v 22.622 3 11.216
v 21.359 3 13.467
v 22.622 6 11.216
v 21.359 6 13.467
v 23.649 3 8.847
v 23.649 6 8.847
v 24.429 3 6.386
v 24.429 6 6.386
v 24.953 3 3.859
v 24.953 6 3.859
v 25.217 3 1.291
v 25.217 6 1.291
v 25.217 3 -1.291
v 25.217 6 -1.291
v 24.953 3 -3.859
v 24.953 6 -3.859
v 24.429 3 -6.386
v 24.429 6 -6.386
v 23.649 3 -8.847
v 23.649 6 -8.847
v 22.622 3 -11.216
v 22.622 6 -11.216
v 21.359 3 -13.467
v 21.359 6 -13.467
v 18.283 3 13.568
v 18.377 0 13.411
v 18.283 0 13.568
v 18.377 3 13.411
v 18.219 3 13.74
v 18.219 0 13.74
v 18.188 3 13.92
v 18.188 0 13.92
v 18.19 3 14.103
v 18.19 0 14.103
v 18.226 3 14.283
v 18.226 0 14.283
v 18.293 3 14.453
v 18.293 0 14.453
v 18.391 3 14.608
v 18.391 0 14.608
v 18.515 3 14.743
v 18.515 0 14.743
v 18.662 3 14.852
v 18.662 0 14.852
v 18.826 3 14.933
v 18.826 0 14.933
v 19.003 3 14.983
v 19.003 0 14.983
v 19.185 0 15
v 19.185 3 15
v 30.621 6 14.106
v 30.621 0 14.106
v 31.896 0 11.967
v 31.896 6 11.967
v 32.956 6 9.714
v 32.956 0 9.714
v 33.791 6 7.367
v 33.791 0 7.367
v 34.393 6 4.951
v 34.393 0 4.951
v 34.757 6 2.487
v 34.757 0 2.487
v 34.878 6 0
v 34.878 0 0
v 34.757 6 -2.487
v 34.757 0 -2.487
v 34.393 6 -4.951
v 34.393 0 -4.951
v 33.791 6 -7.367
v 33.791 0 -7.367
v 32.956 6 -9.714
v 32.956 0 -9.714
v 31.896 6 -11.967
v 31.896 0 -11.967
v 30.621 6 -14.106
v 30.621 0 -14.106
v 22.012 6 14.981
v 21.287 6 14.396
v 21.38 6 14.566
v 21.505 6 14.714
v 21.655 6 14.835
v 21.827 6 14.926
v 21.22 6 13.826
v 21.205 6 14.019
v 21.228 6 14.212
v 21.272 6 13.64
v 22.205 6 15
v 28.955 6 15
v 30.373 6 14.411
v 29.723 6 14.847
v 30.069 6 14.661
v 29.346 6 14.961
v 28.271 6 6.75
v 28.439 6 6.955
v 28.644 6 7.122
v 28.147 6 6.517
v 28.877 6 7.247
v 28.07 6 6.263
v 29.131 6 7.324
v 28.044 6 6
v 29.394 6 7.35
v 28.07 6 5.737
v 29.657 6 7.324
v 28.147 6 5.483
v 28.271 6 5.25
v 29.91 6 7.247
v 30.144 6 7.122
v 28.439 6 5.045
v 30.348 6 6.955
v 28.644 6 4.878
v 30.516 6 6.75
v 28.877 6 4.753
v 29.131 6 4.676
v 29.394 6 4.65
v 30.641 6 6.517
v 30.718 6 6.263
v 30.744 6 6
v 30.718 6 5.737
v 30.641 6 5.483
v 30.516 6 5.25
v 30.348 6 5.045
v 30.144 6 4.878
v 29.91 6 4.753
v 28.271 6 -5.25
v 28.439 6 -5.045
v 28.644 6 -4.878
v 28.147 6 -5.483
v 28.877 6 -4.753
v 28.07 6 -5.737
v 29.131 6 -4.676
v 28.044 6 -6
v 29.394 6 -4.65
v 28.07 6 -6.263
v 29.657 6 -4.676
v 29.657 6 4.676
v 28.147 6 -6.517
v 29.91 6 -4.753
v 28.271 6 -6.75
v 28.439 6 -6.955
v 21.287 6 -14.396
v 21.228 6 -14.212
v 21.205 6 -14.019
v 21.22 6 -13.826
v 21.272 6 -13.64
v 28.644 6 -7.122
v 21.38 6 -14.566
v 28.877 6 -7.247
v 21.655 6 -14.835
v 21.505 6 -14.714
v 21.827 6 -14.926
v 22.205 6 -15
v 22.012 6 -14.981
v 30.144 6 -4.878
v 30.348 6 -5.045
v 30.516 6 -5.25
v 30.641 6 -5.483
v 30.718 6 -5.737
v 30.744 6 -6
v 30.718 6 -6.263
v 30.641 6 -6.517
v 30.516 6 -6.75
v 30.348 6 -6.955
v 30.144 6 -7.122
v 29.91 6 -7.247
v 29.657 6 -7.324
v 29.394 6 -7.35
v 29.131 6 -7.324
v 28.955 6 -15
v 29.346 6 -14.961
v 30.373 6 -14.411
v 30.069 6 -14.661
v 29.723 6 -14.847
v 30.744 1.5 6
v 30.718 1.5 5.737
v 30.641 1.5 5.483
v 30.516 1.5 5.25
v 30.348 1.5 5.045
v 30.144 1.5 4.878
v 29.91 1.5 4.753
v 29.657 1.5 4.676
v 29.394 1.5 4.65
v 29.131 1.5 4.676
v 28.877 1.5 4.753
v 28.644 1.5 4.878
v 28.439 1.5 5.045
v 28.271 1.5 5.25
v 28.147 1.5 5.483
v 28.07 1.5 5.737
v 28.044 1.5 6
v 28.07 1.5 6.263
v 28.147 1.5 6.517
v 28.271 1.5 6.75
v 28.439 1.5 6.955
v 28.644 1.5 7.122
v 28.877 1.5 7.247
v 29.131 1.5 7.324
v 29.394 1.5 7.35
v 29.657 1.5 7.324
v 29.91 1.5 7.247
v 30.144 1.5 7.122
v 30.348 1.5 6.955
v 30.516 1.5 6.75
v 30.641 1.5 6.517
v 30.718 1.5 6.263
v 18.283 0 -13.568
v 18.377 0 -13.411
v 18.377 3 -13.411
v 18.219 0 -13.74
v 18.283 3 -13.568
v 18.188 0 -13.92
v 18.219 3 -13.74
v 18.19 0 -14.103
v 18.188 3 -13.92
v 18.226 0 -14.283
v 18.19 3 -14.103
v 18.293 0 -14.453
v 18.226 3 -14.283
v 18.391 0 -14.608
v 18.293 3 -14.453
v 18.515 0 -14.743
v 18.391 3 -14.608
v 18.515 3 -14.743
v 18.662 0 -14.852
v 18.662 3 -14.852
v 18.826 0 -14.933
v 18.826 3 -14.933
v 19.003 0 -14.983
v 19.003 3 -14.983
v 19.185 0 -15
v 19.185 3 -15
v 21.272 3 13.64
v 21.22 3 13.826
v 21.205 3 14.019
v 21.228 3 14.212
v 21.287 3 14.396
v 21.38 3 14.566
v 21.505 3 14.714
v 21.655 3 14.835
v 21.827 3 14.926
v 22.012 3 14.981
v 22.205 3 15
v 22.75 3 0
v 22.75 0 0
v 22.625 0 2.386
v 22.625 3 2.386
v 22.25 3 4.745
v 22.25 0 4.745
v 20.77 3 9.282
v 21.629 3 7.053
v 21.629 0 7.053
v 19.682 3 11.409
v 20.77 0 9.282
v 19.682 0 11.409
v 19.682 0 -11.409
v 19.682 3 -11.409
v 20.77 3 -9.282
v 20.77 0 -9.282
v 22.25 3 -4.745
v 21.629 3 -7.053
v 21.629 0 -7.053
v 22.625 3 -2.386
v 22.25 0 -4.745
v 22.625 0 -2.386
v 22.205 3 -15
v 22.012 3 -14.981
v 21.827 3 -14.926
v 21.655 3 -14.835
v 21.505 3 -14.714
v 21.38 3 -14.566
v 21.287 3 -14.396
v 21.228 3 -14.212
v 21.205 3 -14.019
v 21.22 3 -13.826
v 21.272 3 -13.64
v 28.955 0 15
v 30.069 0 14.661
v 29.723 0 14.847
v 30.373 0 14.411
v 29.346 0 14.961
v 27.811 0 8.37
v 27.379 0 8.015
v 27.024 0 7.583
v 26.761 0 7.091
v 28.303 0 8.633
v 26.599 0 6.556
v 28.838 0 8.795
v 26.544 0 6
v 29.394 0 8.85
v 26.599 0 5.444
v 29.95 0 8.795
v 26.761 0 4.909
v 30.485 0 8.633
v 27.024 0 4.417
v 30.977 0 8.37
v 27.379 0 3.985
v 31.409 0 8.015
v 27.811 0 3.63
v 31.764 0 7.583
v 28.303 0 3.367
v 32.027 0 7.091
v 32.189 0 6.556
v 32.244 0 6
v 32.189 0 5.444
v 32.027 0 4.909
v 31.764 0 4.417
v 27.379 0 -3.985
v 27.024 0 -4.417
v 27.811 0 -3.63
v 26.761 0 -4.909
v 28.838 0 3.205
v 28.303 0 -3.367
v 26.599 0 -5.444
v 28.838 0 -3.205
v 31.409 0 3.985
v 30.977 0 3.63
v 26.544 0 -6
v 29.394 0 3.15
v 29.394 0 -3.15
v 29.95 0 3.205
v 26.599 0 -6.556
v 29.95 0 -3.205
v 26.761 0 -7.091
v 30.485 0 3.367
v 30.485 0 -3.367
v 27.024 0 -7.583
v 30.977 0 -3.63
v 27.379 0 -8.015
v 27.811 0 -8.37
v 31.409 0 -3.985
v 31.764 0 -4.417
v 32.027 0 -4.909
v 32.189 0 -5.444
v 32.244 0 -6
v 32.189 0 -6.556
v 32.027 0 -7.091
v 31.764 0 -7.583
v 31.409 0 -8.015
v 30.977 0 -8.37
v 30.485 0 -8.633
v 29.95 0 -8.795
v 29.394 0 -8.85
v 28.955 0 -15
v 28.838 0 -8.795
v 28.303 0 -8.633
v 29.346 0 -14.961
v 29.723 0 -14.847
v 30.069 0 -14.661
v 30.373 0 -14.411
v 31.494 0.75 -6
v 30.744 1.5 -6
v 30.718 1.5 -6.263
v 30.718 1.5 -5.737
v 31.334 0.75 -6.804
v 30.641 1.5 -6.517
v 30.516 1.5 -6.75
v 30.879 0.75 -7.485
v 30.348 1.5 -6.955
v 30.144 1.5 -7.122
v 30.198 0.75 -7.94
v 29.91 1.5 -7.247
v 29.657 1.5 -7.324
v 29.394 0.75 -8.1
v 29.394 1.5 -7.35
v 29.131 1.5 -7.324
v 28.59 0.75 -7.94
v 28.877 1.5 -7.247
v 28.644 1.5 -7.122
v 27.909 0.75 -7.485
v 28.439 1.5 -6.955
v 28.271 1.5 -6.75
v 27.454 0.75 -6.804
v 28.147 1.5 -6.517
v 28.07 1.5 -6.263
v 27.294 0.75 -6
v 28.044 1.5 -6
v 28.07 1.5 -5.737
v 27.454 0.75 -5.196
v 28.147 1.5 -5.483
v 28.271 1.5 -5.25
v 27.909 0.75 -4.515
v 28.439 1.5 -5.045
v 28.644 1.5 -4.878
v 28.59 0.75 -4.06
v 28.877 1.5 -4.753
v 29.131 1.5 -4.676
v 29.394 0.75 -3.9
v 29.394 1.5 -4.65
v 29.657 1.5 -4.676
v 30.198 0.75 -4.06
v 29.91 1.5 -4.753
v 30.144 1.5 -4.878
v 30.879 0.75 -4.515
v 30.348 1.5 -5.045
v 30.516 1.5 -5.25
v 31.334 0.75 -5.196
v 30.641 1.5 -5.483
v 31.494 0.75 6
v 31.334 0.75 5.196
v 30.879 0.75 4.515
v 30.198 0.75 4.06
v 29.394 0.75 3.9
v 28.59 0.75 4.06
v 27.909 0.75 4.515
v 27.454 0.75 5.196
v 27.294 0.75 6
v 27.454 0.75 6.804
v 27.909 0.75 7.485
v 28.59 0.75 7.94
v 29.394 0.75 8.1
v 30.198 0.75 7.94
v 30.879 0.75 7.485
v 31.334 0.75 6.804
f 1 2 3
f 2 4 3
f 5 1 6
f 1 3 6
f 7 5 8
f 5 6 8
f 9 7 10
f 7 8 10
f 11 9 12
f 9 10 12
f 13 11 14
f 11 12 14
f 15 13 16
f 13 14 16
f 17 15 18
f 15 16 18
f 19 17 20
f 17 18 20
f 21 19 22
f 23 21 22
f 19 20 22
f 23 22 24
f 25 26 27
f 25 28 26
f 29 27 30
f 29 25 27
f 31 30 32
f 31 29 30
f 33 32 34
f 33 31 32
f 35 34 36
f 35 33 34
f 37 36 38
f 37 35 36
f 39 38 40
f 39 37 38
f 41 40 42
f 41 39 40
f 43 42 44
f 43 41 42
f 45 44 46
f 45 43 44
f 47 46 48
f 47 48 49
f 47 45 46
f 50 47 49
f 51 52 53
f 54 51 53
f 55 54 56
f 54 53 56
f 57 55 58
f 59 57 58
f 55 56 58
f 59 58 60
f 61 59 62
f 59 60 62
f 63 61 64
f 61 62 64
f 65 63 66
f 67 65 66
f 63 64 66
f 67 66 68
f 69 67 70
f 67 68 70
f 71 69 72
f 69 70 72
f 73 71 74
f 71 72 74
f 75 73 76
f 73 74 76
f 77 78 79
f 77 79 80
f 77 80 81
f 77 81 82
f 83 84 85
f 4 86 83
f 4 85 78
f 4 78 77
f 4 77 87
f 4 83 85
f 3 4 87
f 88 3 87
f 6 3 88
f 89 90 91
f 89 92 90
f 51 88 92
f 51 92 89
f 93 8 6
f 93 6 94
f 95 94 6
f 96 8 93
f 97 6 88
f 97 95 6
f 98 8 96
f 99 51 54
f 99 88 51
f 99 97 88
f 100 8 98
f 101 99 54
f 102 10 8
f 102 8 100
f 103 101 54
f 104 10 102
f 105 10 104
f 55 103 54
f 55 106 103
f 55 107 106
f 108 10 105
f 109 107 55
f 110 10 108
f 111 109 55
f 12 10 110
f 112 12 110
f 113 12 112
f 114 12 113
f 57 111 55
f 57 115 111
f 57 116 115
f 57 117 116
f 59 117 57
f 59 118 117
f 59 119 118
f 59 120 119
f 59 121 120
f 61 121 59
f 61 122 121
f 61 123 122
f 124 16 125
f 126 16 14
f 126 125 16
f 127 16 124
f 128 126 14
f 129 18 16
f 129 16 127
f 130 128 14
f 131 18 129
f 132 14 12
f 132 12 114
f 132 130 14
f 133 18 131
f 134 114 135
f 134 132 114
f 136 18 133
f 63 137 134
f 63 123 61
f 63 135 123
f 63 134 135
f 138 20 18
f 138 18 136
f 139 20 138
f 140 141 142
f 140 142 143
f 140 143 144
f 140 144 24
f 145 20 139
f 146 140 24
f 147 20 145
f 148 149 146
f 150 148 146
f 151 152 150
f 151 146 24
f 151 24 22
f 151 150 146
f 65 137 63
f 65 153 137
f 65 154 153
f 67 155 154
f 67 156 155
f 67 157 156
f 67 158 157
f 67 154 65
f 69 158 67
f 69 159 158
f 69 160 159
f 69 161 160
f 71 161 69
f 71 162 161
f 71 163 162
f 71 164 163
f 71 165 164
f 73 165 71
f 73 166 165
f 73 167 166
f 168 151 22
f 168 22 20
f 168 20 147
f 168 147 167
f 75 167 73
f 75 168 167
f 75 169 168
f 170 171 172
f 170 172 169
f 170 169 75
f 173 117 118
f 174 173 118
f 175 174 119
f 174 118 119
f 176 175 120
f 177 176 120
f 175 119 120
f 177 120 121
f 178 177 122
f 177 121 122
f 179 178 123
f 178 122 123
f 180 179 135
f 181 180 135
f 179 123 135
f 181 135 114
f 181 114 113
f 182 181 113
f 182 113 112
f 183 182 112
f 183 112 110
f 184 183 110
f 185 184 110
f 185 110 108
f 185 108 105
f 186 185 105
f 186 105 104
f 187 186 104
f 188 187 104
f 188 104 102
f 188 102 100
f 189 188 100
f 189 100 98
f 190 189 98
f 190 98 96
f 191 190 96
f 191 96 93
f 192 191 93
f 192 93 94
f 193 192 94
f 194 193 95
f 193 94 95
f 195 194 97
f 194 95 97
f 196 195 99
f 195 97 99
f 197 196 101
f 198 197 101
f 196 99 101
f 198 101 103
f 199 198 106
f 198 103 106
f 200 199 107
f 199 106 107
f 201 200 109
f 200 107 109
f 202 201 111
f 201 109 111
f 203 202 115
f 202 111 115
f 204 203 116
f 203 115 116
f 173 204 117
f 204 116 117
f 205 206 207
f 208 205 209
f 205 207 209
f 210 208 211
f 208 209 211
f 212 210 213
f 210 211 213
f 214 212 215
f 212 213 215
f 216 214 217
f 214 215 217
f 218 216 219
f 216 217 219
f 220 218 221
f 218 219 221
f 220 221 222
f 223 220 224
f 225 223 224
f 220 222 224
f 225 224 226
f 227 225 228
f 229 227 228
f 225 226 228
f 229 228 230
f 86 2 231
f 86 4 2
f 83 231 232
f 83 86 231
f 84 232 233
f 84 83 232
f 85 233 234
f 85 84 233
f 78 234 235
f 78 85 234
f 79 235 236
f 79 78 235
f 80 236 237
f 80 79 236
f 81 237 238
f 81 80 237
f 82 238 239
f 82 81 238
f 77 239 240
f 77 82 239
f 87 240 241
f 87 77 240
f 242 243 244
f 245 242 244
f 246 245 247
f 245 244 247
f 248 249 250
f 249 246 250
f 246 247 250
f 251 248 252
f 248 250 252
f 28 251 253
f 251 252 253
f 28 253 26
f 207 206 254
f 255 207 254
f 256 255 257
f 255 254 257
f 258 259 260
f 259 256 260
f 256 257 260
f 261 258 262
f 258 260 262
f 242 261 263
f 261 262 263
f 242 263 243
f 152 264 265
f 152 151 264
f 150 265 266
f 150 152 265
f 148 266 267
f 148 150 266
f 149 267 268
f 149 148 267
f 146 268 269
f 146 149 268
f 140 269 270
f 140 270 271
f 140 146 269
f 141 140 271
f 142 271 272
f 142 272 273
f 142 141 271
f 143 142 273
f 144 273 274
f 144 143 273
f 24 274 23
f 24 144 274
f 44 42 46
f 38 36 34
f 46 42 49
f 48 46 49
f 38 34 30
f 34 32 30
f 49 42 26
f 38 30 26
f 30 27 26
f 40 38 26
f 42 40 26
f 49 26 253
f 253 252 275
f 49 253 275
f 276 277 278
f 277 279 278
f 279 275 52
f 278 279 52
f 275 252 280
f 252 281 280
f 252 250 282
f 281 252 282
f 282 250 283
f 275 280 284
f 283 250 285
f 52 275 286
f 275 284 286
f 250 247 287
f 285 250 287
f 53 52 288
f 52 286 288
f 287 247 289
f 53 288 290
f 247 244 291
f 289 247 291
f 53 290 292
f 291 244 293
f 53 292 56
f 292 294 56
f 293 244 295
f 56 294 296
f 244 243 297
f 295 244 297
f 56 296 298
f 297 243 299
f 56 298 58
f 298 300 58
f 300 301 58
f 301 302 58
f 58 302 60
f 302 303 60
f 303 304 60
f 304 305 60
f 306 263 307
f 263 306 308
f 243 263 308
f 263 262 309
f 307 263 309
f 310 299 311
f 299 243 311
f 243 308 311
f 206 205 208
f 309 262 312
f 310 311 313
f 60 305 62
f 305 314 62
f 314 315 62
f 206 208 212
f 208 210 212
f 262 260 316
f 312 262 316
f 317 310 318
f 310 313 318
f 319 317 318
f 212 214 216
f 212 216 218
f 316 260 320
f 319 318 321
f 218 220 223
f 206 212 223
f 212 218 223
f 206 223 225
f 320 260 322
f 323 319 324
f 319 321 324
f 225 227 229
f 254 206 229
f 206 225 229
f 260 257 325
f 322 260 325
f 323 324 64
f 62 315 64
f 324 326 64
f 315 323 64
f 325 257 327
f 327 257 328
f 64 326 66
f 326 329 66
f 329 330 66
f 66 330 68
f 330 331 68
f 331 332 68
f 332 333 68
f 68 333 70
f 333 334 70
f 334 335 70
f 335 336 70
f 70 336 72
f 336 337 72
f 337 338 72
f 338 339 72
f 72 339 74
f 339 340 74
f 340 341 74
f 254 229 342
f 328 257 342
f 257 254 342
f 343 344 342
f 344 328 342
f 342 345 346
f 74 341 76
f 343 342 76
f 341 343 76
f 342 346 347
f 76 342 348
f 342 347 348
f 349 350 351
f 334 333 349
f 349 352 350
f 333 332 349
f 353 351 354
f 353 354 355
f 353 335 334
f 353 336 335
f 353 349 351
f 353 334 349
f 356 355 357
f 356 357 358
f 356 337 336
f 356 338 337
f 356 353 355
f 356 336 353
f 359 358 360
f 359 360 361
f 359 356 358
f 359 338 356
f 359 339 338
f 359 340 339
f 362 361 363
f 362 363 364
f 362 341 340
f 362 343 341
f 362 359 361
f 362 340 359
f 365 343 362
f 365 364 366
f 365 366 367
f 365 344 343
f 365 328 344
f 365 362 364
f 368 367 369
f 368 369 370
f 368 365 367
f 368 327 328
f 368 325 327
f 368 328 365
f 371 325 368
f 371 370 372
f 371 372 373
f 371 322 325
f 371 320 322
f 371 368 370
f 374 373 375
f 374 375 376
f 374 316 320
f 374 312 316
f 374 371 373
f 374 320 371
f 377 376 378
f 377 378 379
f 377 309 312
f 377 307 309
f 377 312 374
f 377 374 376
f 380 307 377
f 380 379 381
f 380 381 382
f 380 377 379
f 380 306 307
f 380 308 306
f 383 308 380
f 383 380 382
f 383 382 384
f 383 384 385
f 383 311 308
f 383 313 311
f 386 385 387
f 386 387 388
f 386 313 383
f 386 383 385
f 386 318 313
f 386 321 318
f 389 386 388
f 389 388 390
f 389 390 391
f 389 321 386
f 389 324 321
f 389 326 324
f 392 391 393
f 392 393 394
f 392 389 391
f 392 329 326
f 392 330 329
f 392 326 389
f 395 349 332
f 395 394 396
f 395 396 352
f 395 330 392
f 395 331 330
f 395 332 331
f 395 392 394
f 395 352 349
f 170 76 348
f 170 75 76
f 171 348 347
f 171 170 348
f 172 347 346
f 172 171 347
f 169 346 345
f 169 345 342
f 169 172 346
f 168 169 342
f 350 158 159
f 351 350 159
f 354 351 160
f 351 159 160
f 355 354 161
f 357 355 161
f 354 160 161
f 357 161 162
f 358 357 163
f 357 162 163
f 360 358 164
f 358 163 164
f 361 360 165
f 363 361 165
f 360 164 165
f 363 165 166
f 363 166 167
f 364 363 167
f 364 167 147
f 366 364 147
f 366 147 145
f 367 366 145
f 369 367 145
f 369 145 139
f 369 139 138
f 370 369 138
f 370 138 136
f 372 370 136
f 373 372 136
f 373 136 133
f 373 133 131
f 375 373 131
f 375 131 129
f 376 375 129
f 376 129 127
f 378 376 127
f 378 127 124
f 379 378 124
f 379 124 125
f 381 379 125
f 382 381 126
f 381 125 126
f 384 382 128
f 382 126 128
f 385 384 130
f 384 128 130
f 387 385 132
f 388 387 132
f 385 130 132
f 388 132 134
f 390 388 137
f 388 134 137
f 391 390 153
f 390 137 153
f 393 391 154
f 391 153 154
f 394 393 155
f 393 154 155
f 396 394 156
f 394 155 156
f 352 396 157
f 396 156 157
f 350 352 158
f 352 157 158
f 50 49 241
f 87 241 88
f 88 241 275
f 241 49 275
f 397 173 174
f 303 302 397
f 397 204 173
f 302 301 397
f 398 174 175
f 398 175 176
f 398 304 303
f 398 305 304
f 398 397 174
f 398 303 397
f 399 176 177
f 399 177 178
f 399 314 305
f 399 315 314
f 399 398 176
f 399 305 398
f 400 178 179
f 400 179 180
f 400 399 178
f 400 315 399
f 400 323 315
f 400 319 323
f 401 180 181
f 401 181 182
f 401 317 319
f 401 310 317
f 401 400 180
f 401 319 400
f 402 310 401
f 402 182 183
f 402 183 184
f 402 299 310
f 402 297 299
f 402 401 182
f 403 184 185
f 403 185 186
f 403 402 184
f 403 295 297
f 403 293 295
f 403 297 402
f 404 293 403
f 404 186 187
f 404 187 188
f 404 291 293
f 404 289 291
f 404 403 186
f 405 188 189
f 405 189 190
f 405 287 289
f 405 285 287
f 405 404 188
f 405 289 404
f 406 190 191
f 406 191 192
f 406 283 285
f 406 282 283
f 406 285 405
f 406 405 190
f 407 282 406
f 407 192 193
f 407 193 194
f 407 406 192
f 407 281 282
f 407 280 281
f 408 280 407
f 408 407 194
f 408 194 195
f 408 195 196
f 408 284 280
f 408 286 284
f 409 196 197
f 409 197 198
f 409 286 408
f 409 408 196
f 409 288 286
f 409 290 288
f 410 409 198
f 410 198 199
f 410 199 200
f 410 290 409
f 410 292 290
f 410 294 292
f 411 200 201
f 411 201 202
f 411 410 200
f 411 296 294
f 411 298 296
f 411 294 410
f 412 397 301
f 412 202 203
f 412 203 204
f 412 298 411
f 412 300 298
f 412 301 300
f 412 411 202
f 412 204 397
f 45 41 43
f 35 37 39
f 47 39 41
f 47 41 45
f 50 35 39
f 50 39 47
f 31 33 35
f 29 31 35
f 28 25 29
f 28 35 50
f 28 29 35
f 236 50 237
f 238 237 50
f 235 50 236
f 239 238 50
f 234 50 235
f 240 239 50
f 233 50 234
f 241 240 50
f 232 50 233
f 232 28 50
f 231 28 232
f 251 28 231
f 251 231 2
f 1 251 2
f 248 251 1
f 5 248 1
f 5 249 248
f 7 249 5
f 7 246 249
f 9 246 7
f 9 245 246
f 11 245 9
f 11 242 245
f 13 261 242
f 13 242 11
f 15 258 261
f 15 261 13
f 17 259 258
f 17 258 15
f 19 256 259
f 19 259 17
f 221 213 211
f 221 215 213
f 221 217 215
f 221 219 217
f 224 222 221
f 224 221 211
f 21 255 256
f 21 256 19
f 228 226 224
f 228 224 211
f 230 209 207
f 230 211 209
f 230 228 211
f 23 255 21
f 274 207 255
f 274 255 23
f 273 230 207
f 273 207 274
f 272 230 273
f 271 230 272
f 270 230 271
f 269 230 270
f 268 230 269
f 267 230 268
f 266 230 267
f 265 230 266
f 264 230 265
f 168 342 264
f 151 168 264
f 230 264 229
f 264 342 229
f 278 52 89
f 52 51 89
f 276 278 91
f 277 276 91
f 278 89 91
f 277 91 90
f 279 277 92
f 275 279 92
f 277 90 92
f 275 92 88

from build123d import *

# Parameters (mm, degrees)
EXTRUDE_1_DEPTH     = 6
SKETCH_2_R          = 25.25
SKETCH_2_R_2        = 22.75
CUT_EXTRUDE_1_DEPTH = 3
FILLET_1_R          = 1
FILLET_2_R          = 2
SKETCH_3_R          = 1.35
CUT_EXTRUDE_2_DEPTH = 7
CHAMFER_1_SIZE      = 1.5


with BuildPart() as part:
    # Эскиз1 → Бобышка-Вытянуть1 (new body)
    with BuildSketch(Plane(origin=(0, 0, 0), x_dir=(1, 0, 0), z_dir=(0, 1, 0))):
        with BuildLine():
            ThreePointArc((22.75, 0), (21.291887311, -8.013615586), (17.104458483, -15))
            Line((17.104458483, -15), (30, -15))
            ThreePointArc((30, -15), (34.878409373, 0), (30, 15))
            Line((30, 15), (17.104458483, 15))
            ThreePointArc((17.104458483, 15), (21.291887311, 8.013615586), (22.75, 0))
        make_face()
    extrude(amount=EXTRUDE_1_DEPTH)

    # Эскиз2 → Вырез-Вытянуть1 (cut)
    with BuildSketch(Plane(origin=(0, 6, 0), x_dir=(1, 0, 0), z_dir=(0, 1, 0))):
        Circle(SKETCH_2_R)
        Circle(SKETCH_2_R_2, mode=Mode.SUBTRACT)
    extrude(amount=-CUT_EXTRUDE_1_DEPTH, mode=Mode.SUBTRACT)

    # Скругление1
    fillet_1_edges = [part.edges().sort_by_distance(p)[0] for p in [
        (17.104458483, 1.5, -15),
        (17.104458483, 1.5, 15),
        (20.311634597, 4.5, 15),
        (20.311634597, 4.5, -15),
    ]]
    fillet(fillet_1_edges, radius=FILLET_1_R)

    # Скругление2
    fillet_2_edges = [part.edges().sort_by_distance(p)[0] for p in [
        (30, 3, -15),
        (30, 3, 15),
    ]]
    fillet(fillet_2_edges, radius=FILLET_2_R)

    # Эскиз3 → Вырез-Вытянуть2 (cut, through all)
    with BuildSketch(Plane(origin=(0, 6, 0), x_dir=(1, 0, 0), z_dir=(0, 1, 0))):
        with Locations((29.393876913, 6)):
            Circle(SKETCH_3_R)
        with Locations((29.393876913, -6)):
            Circle(SKETCH_3_R)
    extrude(amount=-CUT_EXTRUDE_2_DEPTH, mode=Mode.SUBTRACT)

    # Фаска1
    chamfer_1_edges = [part.edges().sort_by_distance(p)[0] for p in [
        (28.043876913, 0, -6),
        (28.043876913, 0, 6),
    ]]
    chamfer(chamfer_1_edges, length=CHAMFER_1_SIZE)


solid = part.part
